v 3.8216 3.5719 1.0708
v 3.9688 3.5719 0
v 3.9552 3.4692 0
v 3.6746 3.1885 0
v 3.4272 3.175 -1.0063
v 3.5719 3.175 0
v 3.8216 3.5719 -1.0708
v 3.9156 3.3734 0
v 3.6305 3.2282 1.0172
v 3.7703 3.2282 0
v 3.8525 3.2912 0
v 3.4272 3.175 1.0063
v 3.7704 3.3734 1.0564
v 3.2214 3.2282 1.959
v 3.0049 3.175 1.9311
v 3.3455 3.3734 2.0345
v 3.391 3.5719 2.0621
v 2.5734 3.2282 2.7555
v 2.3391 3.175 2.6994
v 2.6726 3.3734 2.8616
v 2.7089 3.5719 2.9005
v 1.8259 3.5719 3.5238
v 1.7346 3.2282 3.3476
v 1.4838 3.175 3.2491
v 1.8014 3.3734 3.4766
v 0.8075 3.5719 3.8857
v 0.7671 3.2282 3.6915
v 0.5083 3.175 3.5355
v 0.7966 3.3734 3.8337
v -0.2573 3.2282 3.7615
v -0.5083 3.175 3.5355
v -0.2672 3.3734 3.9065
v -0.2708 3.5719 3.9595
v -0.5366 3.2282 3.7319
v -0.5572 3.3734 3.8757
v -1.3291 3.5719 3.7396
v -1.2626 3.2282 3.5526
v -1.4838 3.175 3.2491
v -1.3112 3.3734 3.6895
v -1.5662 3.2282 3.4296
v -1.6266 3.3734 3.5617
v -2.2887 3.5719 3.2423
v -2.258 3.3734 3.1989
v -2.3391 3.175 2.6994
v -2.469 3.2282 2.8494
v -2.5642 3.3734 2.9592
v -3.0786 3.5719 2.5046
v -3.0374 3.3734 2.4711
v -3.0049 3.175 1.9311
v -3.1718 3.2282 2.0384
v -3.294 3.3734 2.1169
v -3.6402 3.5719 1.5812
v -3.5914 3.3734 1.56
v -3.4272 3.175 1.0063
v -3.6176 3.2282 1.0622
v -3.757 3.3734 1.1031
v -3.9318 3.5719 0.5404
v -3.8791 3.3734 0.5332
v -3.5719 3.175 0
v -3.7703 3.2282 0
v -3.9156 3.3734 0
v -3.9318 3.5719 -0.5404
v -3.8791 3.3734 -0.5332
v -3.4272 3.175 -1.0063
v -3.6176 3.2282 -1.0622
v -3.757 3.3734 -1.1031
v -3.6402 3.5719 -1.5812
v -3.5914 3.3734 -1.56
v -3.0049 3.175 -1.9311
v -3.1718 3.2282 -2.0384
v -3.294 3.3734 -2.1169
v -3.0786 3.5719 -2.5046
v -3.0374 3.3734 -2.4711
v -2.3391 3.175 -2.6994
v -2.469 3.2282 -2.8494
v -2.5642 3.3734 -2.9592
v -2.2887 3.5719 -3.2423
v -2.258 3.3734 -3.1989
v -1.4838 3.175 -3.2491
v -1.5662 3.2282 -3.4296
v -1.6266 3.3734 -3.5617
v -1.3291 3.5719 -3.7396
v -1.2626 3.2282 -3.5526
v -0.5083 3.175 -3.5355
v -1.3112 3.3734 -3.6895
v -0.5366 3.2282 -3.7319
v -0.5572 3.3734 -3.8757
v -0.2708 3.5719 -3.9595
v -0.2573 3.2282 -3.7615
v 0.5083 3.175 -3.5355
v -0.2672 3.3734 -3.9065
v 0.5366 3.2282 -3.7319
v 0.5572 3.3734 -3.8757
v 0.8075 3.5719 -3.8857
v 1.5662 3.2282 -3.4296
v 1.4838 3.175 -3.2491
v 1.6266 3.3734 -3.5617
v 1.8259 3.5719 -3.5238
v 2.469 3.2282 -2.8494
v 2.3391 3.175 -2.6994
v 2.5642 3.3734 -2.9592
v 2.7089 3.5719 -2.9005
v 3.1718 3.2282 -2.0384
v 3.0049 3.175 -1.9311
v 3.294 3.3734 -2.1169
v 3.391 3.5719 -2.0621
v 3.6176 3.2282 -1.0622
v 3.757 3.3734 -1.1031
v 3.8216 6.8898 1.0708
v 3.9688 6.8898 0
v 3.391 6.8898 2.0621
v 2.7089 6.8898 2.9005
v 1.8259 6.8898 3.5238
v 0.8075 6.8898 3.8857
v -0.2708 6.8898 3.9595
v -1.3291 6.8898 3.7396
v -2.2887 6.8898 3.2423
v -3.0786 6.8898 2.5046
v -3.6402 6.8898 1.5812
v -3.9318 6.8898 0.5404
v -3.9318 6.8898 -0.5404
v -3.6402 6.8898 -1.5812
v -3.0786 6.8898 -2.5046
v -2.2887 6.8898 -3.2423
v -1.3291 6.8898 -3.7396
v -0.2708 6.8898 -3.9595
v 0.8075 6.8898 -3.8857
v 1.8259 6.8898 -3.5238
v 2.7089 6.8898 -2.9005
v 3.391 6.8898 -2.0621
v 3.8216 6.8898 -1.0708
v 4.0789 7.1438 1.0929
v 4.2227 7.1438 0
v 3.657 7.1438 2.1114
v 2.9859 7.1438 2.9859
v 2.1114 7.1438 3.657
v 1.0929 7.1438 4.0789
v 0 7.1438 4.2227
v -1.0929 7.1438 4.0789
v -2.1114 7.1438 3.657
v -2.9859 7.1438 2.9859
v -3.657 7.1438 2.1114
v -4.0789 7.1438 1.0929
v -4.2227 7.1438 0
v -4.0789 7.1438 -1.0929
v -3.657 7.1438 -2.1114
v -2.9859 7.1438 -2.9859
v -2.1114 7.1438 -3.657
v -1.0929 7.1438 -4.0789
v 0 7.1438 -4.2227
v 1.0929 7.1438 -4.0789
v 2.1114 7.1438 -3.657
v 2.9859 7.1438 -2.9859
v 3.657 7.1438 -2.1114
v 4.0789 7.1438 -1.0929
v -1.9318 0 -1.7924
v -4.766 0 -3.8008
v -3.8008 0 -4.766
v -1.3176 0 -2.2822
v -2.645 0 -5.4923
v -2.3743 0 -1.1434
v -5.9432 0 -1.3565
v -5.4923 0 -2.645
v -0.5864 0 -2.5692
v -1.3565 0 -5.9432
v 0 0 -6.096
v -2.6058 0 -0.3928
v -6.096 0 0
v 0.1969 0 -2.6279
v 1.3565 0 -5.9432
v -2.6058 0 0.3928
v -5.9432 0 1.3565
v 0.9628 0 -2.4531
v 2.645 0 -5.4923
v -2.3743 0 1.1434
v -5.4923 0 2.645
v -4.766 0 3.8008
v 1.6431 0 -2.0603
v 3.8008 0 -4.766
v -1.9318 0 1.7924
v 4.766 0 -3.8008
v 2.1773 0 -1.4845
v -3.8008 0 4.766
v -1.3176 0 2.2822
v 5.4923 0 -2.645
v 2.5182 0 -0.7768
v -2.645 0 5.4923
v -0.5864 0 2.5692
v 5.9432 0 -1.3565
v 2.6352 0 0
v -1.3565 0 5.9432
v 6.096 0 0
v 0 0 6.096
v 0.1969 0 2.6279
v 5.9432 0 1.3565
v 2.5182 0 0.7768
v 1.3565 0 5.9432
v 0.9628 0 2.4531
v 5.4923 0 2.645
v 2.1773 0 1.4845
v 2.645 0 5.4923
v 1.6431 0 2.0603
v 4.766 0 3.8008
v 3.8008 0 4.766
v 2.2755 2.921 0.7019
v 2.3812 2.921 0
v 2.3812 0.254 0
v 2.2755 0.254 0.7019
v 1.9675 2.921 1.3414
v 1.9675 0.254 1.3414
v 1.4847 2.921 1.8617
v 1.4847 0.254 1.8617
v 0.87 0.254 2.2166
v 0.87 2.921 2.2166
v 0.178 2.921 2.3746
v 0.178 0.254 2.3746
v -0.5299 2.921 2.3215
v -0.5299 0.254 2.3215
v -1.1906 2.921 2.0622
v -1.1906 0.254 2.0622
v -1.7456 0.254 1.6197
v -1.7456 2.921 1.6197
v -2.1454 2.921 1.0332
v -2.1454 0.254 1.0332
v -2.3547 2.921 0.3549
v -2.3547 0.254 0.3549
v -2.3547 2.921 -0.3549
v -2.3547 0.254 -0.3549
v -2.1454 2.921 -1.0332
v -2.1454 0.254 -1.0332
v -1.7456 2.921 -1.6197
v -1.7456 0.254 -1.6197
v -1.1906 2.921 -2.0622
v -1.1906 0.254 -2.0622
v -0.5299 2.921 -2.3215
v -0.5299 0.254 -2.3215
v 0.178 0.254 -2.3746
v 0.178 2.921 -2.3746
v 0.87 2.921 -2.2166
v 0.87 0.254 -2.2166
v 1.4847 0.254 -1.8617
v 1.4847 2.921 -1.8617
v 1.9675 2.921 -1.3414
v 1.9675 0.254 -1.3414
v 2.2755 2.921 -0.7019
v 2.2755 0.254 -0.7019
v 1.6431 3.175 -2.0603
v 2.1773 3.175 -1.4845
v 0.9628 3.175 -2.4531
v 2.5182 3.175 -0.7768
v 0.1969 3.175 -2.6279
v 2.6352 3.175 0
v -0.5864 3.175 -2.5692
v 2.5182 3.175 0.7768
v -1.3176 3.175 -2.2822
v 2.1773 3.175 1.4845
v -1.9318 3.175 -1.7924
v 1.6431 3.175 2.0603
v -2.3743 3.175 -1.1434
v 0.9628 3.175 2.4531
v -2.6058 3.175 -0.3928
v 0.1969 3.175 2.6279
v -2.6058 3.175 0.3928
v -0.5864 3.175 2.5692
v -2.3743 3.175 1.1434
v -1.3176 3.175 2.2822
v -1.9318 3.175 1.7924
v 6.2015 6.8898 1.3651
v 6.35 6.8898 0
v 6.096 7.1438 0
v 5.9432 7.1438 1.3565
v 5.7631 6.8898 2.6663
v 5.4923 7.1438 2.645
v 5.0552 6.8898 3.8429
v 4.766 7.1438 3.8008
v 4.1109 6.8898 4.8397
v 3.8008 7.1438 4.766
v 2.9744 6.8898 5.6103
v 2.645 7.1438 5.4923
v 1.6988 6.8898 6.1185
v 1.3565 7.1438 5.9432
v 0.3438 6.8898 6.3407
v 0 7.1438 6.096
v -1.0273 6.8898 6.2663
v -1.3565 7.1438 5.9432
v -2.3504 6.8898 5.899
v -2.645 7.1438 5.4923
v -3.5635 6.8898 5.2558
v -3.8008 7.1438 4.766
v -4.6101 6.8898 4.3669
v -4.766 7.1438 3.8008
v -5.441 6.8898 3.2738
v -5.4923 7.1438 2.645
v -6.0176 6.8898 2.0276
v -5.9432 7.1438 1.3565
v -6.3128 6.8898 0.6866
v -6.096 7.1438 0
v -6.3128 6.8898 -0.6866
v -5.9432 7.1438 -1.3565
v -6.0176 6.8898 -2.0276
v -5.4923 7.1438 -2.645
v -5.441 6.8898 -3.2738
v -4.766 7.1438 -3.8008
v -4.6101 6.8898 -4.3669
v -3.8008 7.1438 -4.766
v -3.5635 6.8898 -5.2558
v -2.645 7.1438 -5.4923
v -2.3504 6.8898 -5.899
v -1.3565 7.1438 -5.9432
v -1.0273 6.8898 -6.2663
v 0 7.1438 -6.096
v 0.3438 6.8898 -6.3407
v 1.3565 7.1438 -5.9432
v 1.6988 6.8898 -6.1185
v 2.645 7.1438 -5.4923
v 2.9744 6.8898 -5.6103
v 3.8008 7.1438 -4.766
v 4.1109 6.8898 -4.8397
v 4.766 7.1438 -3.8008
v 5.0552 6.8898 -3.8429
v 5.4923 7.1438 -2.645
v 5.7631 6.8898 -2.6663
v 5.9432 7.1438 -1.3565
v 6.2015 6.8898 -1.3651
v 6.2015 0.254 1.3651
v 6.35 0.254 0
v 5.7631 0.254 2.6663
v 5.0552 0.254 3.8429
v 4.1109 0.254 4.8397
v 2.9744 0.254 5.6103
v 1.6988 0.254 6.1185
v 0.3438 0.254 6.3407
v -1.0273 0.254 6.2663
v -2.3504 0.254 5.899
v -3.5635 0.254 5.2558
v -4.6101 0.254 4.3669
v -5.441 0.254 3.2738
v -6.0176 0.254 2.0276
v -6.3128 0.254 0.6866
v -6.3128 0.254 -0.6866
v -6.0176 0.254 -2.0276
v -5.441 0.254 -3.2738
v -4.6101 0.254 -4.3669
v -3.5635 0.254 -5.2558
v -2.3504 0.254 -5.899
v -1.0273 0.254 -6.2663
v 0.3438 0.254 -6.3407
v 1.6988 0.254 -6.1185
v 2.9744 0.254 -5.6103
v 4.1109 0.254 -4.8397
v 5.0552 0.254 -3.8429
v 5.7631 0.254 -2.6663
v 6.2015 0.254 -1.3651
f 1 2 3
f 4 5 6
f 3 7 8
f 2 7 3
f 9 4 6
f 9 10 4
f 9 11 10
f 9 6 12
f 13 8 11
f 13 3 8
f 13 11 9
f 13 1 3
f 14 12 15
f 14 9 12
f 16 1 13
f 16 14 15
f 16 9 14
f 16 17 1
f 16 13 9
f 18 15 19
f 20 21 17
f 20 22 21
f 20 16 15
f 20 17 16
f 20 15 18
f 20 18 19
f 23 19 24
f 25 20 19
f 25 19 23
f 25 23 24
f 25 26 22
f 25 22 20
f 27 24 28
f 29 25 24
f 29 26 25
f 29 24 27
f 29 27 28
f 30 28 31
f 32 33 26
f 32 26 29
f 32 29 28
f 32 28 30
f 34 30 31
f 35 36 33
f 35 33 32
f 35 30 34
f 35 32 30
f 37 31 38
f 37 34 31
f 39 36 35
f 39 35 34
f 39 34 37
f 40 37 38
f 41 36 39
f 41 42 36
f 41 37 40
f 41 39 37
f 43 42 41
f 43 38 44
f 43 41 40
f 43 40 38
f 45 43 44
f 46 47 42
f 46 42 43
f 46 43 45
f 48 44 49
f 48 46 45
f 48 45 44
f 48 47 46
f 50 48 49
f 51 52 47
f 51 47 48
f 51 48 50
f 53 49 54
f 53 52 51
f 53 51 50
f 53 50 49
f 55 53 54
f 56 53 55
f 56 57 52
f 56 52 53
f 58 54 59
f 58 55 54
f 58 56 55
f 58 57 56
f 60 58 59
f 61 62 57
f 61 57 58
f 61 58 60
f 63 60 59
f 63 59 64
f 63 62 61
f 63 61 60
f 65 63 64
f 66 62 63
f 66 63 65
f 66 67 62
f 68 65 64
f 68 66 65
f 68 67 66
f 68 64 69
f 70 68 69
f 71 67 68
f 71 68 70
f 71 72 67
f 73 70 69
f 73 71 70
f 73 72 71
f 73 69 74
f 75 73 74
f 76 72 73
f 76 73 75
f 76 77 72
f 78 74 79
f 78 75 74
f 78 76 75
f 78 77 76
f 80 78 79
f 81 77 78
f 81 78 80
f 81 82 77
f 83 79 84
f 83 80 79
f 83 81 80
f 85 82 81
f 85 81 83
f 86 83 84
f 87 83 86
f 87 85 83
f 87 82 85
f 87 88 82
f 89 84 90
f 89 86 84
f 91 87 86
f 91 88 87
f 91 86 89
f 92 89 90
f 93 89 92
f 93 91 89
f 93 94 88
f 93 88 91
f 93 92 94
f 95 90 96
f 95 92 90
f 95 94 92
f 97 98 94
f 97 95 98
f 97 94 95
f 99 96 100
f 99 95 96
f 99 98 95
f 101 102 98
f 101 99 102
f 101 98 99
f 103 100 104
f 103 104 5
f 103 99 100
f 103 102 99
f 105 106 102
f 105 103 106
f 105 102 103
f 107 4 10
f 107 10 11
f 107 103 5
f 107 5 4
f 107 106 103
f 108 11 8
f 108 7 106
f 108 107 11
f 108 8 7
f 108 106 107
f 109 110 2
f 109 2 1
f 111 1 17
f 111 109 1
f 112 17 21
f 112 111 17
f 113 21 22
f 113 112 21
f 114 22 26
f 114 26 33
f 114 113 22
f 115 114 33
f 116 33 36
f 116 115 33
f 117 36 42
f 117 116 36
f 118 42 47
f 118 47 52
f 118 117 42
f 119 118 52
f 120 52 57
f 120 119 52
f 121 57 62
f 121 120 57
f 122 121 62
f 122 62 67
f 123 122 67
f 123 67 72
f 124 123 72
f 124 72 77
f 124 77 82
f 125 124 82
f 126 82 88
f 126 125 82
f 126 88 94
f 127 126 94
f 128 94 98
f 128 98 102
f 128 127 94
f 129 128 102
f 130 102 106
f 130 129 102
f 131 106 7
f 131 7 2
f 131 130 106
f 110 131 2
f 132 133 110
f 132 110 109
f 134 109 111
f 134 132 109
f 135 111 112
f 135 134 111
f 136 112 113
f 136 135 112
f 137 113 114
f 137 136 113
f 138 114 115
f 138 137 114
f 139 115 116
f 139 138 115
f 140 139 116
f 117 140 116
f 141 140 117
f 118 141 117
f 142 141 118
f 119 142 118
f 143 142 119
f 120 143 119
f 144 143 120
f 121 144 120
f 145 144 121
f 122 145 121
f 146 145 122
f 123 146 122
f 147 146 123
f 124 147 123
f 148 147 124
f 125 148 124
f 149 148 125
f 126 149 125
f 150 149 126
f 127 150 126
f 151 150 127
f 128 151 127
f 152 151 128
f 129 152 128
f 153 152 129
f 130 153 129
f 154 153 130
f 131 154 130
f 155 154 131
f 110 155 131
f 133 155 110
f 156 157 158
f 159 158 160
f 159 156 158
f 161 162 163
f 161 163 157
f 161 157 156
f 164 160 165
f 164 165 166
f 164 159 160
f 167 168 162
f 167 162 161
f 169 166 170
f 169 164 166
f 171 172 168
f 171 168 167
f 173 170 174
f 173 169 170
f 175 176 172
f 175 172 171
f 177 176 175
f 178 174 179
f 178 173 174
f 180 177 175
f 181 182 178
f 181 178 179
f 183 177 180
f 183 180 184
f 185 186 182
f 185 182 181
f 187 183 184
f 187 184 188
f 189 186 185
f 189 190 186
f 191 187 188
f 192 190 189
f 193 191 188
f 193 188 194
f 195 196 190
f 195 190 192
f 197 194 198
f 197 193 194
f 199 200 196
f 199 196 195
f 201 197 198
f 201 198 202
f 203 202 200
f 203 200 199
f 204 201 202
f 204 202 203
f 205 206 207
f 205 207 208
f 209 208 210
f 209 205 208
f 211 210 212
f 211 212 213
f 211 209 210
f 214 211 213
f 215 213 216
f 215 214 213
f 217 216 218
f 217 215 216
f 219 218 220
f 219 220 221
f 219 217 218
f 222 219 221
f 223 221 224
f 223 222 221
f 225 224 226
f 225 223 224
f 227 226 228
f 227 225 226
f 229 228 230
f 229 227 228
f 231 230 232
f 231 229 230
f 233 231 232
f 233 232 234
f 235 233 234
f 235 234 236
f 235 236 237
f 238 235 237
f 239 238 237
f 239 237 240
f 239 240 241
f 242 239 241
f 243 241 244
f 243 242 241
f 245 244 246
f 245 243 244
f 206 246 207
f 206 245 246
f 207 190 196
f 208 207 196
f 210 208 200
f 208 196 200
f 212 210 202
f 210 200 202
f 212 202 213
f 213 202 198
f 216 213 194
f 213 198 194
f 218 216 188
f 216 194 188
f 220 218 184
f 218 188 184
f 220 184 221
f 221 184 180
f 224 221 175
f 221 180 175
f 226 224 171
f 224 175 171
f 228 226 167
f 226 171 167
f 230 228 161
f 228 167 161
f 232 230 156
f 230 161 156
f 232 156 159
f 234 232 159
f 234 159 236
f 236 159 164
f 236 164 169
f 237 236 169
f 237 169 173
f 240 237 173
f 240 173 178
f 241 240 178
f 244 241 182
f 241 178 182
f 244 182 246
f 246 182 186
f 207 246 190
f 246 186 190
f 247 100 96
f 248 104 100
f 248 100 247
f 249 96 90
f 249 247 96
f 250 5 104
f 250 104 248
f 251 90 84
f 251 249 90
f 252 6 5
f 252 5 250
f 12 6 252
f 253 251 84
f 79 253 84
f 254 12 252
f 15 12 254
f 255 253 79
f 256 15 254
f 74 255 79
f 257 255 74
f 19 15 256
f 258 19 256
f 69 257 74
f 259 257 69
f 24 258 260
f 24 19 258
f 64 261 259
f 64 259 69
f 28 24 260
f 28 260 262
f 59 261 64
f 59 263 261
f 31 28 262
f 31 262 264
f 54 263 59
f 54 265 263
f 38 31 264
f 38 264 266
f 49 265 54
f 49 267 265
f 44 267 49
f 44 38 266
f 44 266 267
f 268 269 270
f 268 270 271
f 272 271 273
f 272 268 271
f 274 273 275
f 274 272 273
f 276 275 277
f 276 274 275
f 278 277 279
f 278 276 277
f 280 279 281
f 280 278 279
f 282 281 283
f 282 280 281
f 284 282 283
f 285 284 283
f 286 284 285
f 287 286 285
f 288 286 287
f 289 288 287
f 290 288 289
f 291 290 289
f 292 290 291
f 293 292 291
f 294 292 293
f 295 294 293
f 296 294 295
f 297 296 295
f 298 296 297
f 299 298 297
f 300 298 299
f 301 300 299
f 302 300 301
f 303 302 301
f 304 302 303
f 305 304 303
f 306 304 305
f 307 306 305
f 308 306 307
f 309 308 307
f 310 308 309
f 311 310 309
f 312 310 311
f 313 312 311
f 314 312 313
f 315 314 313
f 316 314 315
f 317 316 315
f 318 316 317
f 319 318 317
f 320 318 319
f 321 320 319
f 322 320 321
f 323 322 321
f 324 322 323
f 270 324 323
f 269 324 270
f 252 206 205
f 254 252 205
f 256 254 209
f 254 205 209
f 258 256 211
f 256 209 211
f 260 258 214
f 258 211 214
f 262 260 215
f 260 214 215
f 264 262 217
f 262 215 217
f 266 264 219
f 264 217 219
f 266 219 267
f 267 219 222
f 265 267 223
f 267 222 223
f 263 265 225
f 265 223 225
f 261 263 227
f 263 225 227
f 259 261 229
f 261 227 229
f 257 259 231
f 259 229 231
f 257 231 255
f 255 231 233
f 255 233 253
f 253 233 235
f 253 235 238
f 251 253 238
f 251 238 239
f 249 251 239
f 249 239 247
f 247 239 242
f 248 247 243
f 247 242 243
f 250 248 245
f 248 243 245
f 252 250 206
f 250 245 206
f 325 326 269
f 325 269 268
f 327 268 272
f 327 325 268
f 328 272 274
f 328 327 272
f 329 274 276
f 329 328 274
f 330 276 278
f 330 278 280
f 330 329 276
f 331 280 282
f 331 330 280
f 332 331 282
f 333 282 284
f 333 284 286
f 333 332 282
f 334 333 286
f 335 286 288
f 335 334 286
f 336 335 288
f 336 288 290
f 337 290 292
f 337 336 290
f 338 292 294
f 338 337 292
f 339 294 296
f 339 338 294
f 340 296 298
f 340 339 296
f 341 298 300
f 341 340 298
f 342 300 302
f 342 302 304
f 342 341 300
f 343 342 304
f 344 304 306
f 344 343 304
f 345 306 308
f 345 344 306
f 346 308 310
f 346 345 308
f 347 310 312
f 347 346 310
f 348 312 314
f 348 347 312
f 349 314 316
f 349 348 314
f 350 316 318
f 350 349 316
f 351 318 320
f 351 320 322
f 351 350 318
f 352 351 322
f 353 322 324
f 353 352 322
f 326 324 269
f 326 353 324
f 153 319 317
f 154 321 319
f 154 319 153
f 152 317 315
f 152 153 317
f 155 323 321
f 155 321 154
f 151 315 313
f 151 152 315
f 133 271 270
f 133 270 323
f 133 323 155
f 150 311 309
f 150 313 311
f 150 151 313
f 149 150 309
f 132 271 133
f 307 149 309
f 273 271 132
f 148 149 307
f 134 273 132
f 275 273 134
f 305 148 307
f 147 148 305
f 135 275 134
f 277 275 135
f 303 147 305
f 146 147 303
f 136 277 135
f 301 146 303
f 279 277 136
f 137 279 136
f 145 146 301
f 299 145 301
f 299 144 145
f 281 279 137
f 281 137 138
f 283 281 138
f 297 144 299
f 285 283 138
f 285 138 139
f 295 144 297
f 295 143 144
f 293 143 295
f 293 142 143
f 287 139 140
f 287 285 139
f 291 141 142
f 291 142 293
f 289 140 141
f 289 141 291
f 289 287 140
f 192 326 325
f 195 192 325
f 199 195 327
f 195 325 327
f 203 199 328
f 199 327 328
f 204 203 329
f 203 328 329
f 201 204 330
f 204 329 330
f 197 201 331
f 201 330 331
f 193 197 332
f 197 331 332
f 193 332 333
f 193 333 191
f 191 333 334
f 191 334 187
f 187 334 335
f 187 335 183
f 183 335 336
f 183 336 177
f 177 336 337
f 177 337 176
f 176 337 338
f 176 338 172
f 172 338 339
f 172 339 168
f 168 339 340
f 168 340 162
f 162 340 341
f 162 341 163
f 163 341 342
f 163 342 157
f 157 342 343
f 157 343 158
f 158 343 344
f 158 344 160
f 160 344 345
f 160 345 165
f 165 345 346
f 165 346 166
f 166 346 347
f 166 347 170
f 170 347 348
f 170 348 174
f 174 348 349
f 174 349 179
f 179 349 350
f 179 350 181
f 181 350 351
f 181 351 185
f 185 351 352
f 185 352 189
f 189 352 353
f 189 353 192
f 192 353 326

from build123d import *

# Parameters (mm, degrees)
FILLET1_R     = 0.396875
CHAMFER1_SIZE = 0.254


with BuildPart() as part:
    # Sketch1 → Revolve1 (revolve)
    with BuildSketch(Plane.XY):
        Polygon((2.38125, 0), (2.38125, 3.175), (3.96875, 3.175), (3.96875, 7.14375), (6.35, 7.14375), (6.35, 0), align=None)
    revolve(axis=Axis((0, 0, 0), (0, -1, 0)))

    # Fillet1
    fillet1_edges = [part.edges().sort_by_distance(p)[0] for p in [
        (-3.96875, 3.175, 0),
    ]]
    fillet(fillet1_edges, radius=FILLET1_R)

    # Chamfer1
    chamfer1_edges = [part.edges().sort_by_distance(p)[0] for p in [
        (-6.35, 0, 0),
        (-6.35, 7.14375, 0),
        (-3.96875, 7.14375, 0),
        (-2.38125, 3.175, 0),
        (-2.38125, 0, 0),
    ]]
    chamfer(chamfer1_edges, length=CHAMFER1_SIZE)


solid = part.part
